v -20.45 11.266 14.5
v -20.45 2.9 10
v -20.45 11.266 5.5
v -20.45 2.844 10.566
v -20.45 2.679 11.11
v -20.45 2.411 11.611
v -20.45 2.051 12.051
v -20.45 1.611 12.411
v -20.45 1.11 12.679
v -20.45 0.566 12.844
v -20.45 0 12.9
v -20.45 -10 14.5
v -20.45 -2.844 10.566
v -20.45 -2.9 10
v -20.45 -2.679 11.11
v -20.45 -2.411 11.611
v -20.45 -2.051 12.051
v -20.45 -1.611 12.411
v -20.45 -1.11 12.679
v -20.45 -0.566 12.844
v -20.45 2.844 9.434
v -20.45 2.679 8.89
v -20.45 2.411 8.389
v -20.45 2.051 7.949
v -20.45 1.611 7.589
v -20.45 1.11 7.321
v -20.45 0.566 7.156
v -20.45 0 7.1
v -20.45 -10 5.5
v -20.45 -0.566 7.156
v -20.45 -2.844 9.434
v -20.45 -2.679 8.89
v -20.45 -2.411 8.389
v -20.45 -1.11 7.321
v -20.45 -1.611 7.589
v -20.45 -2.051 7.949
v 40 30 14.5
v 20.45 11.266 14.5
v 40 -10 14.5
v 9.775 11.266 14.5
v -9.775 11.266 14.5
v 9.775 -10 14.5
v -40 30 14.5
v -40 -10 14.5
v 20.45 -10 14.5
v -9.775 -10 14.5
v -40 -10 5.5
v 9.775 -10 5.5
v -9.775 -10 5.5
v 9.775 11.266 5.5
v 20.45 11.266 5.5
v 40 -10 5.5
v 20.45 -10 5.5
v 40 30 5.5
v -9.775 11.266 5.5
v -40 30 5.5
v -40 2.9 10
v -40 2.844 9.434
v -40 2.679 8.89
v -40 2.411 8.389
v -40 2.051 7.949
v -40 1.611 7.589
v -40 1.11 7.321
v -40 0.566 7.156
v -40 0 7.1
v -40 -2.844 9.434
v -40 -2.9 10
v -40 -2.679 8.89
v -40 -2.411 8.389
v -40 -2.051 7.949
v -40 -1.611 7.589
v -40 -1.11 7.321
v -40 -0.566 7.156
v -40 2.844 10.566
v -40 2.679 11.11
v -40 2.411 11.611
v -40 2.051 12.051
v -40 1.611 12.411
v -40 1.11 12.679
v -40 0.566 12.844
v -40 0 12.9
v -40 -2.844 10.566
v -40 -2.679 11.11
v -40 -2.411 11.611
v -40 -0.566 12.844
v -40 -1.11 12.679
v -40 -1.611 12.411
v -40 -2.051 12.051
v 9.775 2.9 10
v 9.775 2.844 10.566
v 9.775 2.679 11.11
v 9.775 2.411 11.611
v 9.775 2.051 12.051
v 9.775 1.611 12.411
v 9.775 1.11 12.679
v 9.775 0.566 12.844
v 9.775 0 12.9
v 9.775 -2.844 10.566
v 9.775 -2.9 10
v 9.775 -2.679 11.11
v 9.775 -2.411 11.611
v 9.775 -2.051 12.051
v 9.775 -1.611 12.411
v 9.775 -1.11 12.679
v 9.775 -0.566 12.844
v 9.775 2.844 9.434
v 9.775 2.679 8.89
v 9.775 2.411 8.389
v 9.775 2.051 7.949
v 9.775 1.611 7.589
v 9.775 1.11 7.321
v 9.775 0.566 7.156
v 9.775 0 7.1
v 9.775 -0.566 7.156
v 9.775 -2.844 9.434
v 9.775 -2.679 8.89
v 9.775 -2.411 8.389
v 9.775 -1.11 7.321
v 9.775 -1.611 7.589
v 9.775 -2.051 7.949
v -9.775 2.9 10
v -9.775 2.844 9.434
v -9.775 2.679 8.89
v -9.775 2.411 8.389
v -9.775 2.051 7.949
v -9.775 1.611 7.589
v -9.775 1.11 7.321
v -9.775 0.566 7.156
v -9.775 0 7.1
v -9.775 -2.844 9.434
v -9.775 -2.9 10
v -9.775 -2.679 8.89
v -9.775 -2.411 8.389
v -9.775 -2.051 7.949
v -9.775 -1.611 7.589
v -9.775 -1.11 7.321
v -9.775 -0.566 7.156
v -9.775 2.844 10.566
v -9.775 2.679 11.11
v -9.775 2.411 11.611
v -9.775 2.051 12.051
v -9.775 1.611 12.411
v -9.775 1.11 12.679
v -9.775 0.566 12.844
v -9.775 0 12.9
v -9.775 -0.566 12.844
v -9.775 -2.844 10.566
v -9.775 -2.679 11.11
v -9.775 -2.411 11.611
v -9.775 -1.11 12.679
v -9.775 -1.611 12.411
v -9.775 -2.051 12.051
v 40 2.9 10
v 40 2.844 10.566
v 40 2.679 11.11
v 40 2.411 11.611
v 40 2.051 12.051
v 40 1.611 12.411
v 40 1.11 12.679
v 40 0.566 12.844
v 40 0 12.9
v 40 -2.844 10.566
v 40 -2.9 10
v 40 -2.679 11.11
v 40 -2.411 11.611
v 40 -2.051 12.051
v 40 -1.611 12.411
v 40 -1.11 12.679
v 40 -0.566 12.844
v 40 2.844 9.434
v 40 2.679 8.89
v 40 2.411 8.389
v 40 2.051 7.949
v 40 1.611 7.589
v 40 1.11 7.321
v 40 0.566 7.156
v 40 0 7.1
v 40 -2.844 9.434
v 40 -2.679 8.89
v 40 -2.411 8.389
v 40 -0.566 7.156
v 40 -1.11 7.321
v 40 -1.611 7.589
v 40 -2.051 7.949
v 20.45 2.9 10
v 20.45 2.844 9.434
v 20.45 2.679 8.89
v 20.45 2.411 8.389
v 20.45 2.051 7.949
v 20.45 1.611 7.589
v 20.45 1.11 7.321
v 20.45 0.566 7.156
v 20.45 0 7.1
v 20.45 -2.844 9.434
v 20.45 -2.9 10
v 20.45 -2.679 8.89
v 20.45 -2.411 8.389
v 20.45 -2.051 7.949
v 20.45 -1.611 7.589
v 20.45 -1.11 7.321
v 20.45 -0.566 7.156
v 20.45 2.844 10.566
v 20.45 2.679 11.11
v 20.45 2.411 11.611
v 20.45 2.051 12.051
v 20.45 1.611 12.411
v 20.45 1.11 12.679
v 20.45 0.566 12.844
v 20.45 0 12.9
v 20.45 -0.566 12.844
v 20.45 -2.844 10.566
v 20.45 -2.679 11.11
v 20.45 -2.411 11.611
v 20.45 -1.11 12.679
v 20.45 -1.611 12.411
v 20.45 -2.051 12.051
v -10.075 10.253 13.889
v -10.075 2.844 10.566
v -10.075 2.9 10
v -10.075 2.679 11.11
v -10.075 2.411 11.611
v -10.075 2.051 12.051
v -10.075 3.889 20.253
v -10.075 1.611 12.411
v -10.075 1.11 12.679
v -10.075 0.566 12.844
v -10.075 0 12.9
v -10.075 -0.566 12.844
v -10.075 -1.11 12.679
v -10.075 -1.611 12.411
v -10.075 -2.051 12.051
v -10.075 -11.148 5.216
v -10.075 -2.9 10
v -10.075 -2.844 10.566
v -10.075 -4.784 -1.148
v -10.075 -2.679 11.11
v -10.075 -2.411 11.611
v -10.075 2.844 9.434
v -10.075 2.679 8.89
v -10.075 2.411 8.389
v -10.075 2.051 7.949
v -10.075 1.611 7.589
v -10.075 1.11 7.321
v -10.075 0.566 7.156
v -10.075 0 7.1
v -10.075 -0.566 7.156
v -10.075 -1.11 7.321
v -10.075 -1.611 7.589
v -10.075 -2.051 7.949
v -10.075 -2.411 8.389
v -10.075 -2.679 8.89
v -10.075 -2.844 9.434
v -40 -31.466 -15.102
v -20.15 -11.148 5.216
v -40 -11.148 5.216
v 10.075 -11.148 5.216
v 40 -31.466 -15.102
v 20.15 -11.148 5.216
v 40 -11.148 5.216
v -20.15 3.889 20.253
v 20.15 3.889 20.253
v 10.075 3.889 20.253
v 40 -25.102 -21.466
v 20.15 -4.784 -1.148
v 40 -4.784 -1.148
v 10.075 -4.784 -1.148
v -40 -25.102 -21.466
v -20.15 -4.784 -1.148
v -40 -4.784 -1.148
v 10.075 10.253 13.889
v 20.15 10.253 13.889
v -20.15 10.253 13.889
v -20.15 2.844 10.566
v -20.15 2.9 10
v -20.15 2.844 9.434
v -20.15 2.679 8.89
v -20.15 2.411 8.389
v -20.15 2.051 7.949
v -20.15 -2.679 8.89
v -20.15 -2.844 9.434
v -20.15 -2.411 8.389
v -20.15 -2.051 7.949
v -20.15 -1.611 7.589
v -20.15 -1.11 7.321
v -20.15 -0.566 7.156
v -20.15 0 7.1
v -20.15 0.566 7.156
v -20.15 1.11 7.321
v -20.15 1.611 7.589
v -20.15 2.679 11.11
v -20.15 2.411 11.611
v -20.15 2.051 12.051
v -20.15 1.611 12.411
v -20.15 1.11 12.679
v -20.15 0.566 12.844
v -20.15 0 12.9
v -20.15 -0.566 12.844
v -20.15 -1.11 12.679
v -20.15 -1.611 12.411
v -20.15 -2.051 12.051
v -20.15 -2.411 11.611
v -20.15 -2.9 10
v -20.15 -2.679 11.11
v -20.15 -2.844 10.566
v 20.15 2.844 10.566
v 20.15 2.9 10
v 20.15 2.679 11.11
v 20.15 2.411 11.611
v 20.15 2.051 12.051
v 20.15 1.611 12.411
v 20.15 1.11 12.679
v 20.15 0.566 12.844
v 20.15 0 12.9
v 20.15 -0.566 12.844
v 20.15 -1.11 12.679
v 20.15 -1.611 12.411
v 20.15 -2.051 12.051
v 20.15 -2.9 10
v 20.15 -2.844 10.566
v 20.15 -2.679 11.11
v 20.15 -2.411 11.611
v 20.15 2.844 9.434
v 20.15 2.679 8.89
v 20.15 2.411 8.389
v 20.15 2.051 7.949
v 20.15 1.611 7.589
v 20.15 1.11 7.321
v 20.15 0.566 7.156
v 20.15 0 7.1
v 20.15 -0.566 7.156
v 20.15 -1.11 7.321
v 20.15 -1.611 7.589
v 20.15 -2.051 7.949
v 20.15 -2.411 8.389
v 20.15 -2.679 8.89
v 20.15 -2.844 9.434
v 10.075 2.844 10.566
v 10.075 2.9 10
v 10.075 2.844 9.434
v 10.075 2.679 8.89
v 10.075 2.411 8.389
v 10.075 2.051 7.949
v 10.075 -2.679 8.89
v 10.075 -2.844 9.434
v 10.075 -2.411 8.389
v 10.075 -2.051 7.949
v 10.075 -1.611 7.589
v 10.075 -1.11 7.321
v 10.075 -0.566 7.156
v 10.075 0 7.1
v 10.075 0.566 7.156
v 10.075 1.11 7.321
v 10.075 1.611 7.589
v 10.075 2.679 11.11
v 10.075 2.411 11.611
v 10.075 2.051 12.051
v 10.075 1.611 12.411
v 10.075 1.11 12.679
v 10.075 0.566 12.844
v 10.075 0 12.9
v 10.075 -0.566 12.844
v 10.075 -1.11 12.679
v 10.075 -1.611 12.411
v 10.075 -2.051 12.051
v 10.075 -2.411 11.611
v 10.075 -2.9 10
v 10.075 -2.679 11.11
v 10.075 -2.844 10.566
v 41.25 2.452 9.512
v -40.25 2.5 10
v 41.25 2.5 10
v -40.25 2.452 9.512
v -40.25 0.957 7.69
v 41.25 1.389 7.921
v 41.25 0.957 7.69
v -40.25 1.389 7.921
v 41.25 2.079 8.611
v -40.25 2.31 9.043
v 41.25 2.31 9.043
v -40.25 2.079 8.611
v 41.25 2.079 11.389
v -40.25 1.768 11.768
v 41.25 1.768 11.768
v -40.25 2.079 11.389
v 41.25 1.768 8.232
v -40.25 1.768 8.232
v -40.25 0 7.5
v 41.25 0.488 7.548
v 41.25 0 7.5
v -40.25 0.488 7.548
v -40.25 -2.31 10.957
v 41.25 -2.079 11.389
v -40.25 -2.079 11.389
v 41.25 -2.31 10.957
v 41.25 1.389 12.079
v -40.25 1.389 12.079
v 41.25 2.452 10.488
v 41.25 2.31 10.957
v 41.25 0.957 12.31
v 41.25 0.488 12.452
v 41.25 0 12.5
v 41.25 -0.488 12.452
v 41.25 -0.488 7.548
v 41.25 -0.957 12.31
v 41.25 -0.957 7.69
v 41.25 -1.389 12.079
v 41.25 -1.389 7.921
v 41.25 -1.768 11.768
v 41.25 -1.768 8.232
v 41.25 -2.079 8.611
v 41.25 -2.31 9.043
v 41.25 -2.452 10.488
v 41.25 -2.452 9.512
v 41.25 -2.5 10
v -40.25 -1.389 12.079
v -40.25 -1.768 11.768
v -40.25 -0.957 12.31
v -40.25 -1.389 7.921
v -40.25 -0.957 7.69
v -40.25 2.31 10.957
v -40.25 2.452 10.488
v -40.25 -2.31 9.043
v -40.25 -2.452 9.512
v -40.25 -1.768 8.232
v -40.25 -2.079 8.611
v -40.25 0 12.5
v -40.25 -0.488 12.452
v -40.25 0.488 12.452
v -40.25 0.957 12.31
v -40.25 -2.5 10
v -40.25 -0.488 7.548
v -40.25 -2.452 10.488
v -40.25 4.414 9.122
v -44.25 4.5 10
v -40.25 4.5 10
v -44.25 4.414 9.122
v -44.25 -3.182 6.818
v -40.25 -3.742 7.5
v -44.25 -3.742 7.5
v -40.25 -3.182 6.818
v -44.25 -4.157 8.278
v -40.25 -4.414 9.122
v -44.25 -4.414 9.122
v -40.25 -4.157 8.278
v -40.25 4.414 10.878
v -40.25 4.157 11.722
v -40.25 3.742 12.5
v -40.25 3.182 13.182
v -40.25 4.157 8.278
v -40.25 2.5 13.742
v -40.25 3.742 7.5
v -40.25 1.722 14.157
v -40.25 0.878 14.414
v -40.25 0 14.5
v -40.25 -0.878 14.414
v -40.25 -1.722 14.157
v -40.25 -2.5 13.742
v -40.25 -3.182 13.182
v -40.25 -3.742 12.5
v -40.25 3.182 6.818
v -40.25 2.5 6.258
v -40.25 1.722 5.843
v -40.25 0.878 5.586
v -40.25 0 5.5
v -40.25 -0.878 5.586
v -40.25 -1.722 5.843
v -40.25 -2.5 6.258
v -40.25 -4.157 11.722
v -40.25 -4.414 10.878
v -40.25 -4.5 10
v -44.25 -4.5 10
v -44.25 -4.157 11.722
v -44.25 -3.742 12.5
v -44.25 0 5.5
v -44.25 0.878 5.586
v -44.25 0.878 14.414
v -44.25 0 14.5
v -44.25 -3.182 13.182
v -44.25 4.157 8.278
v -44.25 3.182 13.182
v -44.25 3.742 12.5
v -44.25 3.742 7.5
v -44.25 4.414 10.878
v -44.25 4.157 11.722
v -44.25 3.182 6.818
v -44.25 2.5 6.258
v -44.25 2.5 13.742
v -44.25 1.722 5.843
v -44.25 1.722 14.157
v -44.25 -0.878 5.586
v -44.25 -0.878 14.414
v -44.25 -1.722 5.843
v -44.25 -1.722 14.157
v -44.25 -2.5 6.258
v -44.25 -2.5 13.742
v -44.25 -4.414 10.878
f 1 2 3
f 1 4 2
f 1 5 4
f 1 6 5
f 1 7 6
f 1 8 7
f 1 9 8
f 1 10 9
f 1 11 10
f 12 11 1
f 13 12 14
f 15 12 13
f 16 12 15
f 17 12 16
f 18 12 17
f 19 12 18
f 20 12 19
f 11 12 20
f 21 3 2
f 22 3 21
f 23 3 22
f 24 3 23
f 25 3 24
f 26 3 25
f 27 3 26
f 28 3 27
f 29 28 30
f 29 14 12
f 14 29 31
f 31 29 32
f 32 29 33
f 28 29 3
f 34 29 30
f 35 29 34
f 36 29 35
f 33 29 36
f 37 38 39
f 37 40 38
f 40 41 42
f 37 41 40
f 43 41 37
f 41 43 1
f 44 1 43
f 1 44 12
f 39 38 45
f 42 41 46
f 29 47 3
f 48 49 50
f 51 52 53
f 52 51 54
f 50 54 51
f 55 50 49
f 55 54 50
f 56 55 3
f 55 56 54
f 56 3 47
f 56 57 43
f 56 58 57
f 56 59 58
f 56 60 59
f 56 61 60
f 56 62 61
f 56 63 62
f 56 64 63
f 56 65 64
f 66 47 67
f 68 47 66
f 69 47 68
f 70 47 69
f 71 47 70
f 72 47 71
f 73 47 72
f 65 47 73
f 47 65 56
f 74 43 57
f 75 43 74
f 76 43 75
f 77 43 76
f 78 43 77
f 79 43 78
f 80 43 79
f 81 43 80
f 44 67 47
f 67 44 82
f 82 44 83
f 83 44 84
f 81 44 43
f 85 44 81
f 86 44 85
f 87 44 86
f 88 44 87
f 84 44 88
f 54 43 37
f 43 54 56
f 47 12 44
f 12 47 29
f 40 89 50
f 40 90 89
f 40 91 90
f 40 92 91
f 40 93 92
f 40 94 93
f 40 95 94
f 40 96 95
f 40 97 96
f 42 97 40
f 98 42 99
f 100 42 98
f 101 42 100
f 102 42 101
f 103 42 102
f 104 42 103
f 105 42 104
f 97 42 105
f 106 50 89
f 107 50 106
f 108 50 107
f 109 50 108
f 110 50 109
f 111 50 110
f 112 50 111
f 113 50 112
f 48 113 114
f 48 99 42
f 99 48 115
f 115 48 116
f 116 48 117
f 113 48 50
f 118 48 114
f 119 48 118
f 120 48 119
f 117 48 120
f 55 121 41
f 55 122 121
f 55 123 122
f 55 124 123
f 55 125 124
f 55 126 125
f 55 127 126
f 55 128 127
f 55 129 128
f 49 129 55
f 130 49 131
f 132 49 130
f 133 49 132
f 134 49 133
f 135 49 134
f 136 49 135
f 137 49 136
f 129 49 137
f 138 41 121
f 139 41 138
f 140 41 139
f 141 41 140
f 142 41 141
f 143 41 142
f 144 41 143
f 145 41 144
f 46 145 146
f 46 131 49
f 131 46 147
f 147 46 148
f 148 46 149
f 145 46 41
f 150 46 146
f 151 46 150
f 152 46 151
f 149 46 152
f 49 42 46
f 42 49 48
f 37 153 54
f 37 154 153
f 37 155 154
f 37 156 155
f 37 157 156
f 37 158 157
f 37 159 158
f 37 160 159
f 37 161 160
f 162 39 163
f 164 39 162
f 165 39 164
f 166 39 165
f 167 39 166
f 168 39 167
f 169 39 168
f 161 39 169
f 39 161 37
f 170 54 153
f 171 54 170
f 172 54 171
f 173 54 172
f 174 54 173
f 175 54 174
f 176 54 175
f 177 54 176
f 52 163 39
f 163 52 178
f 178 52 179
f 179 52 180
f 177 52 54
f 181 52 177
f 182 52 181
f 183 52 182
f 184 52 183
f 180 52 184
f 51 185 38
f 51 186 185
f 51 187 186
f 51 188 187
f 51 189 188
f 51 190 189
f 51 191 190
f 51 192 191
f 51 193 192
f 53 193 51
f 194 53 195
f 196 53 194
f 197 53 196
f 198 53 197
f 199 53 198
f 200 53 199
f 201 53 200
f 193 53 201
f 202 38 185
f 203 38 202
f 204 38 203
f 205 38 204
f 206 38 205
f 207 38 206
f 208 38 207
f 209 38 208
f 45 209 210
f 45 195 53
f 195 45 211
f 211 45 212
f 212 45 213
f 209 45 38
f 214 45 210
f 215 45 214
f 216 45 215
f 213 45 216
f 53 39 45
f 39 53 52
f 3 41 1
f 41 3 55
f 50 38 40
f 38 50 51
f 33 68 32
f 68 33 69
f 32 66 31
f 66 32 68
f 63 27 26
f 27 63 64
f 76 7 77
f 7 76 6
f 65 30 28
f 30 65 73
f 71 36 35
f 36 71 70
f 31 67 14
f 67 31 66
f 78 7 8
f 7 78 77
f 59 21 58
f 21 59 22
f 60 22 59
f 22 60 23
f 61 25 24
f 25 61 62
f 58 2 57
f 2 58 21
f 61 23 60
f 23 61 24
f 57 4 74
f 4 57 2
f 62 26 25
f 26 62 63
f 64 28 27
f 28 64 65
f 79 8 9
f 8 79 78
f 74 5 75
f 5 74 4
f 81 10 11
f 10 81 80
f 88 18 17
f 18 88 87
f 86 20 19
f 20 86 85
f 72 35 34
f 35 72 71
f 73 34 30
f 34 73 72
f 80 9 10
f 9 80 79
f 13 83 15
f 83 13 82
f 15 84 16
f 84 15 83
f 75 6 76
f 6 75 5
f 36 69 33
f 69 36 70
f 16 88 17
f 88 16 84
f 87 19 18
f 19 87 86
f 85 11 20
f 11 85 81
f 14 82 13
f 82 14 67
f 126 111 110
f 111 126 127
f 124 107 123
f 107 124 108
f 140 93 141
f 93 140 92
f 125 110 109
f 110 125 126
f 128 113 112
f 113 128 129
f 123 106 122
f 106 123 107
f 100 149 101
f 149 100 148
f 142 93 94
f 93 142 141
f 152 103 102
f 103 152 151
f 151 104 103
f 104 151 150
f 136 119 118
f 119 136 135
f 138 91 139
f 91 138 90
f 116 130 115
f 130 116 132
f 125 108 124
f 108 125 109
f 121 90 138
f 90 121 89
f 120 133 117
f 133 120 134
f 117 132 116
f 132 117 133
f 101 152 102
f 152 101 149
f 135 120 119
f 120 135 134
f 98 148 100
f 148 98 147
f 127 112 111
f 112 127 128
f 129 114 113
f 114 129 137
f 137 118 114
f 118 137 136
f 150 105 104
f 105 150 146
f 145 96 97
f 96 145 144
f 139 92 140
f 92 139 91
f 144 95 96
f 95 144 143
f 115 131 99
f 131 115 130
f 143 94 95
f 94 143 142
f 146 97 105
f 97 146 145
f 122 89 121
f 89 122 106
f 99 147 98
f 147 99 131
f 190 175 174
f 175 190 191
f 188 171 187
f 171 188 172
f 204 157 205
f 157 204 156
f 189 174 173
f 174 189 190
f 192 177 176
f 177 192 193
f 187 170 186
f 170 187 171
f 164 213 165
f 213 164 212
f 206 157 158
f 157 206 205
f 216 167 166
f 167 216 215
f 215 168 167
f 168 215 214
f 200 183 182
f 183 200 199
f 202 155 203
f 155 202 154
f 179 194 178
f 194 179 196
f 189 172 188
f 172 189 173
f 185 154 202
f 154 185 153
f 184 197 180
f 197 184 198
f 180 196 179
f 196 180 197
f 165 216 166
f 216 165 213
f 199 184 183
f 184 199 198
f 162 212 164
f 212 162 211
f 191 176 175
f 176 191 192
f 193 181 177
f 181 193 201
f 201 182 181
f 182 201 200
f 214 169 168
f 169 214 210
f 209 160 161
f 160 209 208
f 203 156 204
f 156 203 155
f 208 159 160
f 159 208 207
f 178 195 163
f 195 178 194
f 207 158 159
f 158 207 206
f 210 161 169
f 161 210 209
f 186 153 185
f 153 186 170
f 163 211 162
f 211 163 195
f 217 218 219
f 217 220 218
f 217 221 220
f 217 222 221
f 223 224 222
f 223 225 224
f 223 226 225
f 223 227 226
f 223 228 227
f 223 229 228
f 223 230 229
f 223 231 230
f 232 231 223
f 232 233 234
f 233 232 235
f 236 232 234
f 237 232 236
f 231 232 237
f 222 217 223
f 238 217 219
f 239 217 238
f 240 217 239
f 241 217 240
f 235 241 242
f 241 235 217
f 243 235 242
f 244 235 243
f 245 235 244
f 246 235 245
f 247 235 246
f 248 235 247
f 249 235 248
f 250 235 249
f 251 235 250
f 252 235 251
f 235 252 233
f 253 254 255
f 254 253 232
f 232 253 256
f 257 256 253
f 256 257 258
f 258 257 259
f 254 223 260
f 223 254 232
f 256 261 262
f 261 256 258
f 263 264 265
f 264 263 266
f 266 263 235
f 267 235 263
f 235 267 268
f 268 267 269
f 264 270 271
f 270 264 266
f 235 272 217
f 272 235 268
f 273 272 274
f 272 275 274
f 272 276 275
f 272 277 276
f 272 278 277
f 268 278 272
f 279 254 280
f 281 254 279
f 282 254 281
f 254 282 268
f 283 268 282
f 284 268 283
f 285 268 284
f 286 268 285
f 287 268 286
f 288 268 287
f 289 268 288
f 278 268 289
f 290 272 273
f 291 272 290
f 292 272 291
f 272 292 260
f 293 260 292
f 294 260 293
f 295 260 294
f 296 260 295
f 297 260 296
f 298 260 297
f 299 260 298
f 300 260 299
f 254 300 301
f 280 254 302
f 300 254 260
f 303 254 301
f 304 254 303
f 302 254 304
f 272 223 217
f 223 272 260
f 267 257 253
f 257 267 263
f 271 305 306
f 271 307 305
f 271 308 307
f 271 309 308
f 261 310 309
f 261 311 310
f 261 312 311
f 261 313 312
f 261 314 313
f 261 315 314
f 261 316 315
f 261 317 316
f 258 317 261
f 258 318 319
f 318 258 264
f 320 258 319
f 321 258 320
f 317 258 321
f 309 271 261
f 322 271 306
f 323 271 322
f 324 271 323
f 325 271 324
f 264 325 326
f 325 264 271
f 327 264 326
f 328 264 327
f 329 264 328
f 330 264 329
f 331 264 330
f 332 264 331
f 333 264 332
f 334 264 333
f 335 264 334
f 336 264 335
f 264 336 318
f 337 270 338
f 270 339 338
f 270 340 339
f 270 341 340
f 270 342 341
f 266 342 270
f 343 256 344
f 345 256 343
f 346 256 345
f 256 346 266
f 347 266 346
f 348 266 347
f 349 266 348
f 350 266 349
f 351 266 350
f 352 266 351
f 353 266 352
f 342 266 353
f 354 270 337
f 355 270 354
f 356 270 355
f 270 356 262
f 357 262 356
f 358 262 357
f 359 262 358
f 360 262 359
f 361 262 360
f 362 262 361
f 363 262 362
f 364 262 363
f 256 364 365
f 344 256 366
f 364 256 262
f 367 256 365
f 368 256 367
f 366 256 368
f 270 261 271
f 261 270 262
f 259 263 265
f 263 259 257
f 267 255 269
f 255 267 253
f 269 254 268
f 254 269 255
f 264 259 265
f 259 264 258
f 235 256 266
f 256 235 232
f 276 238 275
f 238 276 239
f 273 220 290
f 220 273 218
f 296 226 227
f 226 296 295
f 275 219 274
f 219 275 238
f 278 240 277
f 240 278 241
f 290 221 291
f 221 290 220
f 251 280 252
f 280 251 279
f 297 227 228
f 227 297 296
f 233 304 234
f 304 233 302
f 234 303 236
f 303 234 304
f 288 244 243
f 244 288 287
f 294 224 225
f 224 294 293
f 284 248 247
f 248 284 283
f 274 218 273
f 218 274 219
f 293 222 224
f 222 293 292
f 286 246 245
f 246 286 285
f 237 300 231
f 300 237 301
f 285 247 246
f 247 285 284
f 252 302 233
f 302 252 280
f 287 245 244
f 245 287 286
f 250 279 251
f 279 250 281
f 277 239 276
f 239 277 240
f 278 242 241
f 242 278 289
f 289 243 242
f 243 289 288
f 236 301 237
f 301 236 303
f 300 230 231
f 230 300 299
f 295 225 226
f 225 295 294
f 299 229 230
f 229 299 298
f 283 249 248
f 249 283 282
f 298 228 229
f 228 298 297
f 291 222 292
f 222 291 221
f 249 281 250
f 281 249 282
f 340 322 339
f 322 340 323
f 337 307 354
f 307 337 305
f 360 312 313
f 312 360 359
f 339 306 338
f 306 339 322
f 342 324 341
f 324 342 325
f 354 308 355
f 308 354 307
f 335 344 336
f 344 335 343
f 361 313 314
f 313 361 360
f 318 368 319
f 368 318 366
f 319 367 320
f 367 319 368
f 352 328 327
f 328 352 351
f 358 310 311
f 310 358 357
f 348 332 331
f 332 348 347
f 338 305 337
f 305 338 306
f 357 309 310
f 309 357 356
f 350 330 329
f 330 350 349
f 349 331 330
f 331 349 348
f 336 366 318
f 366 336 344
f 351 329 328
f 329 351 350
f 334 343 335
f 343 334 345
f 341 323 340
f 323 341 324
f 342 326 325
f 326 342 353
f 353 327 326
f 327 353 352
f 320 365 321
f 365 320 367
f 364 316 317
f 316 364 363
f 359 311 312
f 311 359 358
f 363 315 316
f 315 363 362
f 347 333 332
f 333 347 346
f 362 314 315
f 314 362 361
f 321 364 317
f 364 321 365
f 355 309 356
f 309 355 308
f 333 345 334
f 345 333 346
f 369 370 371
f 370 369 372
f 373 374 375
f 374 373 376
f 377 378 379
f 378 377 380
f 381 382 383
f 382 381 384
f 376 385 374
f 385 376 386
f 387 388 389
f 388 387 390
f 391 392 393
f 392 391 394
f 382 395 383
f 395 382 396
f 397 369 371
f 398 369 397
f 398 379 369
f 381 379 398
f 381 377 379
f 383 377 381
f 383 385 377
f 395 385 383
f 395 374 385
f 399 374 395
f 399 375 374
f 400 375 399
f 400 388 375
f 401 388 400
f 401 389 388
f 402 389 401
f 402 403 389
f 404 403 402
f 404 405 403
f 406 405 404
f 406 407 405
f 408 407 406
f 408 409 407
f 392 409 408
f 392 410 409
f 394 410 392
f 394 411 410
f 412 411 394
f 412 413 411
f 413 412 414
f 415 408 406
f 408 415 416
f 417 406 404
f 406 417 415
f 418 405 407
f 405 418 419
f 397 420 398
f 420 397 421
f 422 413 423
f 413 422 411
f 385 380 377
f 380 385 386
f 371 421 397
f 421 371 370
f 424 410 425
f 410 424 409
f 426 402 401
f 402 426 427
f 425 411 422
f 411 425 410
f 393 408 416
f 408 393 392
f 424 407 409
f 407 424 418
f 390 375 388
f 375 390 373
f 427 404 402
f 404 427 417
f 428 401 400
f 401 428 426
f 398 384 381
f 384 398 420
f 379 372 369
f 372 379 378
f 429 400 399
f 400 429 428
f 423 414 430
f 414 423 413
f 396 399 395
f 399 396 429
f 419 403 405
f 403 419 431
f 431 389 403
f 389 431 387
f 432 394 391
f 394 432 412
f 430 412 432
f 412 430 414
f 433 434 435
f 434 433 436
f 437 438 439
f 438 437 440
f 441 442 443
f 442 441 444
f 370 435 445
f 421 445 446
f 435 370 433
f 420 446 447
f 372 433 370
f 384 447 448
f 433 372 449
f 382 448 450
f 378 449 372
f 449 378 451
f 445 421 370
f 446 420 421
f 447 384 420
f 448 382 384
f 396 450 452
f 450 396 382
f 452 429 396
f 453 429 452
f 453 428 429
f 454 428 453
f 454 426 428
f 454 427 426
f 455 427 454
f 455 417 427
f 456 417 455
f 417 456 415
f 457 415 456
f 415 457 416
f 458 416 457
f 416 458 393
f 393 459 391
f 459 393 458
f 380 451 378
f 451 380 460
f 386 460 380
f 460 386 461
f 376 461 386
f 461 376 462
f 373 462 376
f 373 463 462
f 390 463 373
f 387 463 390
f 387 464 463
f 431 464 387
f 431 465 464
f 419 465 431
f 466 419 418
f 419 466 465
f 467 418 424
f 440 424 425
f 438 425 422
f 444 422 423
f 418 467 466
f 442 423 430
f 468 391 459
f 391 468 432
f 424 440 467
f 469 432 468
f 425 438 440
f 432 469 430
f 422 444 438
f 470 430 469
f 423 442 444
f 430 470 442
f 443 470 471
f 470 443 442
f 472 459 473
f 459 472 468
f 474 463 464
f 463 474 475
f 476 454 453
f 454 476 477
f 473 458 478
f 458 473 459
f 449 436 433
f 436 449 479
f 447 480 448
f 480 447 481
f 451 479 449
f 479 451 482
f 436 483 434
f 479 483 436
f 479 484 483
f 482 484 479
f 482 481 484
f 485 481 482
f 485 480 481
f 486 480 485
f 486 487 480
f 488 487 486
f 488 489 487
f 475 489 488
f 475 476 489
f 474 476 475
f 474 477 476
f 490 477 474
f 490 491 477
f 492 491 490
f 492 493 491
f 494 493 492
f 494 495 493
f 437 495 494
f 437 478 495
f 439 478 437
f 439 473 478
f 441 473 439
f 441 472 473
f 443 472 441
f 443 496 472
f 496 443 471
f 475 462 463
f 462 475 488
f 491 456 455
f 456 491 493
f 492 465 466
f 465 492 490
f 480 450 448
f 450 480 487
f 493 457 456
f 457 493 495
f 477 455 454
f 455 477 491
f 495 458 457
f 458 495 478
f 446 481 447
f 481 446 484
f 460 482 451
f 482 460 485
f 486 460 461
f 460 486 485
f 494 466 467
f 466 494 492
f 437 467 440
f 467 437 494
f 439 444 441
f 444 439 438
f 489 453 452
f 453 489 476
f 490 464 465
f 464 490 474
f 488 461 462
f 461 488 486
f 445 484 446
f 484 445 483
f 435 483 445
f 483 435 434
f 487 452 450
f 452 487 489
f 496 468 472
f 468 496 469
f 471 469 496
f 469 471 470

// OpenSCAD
$fn = 32;

// ------------------------------------------------------------------------
// Butt hinge: hinge 80 mm, leaf swung 45 deg
// Every part is its own module, assembly() places every instance.
// ------------------------------------------------------------------------

// --- part 1 ---
module hinge_base() {
  difference() {
    union() {
      translate([-40, -10, -4.5]) cube([19.55, 40, 9]);
      translate([-9.775, -10, -4.5]) cube([19.55, 40, 9]);
      translate([20.45, -10, -4.5]) cube([19.55, 40, 9]);
      translate([-40, 11.266, -4.5]) cube([80, 18.734, 9]);
    }
    translate([-30.225, 0, 0]) rotate([0, 90, 0]) cylinder(h = 21.55, d = 5.8, center = true);
    translate([0, 0, 0]) rotate([0, 90, 0]) cylinder(h = 21.55, d = 5.8, center = true);
    translate([30.225, 0, 0]) rotate([0, 90, 0]) cylinder(h = 21.55, d = 5.8, center = true);
  }
}

// --- part 2 ---
module hinge_mover() {
  difference() {
    union() {
      translate([-20.15, -40, -4.5]) cube([10.075, 50, 9]);
      translate([10.075, -40, -4.5]) cube([10.075, 50, 9]);
      translate([-40, -40, -4.5]) cube([80, 28.734, 9]);
    }
    translate([-15.113, 0, 0]) rotate([0, 90, 0]) cylinder(h = 12.075, d = 5.8, center = true);
    translate([15.113, 0, 0]) rotate([0, 90, 0]) cylinder(h = 12.075, d = 5.8, center = true);
  }
}

// --- part 3 ---
module hinge_pin() {
  rotate([0, 90, 0]) cylinder(h = 82.5, d = 5, center = true);
  translate([-44.25, 0, 0]) rotate([0, 90, 0]) cylinder(h = 4, d = 9);
}

// --- assembly ---
module assembly() {
  color([0.80, 0.24, 0.20]) translate([0, 0, 10]) rotate([0, 0, 0]) hinge_base();
  color([0.20, 0.45, 0.75]) translate([0, 0, 10]) rotate([45, 0, 0]) hinge_mover();
  color([0.25, 0.62, 0.32]) translate([0, 0, 10]) rotate([0, 0, 0]) hinge_pin();
}

assembly();
